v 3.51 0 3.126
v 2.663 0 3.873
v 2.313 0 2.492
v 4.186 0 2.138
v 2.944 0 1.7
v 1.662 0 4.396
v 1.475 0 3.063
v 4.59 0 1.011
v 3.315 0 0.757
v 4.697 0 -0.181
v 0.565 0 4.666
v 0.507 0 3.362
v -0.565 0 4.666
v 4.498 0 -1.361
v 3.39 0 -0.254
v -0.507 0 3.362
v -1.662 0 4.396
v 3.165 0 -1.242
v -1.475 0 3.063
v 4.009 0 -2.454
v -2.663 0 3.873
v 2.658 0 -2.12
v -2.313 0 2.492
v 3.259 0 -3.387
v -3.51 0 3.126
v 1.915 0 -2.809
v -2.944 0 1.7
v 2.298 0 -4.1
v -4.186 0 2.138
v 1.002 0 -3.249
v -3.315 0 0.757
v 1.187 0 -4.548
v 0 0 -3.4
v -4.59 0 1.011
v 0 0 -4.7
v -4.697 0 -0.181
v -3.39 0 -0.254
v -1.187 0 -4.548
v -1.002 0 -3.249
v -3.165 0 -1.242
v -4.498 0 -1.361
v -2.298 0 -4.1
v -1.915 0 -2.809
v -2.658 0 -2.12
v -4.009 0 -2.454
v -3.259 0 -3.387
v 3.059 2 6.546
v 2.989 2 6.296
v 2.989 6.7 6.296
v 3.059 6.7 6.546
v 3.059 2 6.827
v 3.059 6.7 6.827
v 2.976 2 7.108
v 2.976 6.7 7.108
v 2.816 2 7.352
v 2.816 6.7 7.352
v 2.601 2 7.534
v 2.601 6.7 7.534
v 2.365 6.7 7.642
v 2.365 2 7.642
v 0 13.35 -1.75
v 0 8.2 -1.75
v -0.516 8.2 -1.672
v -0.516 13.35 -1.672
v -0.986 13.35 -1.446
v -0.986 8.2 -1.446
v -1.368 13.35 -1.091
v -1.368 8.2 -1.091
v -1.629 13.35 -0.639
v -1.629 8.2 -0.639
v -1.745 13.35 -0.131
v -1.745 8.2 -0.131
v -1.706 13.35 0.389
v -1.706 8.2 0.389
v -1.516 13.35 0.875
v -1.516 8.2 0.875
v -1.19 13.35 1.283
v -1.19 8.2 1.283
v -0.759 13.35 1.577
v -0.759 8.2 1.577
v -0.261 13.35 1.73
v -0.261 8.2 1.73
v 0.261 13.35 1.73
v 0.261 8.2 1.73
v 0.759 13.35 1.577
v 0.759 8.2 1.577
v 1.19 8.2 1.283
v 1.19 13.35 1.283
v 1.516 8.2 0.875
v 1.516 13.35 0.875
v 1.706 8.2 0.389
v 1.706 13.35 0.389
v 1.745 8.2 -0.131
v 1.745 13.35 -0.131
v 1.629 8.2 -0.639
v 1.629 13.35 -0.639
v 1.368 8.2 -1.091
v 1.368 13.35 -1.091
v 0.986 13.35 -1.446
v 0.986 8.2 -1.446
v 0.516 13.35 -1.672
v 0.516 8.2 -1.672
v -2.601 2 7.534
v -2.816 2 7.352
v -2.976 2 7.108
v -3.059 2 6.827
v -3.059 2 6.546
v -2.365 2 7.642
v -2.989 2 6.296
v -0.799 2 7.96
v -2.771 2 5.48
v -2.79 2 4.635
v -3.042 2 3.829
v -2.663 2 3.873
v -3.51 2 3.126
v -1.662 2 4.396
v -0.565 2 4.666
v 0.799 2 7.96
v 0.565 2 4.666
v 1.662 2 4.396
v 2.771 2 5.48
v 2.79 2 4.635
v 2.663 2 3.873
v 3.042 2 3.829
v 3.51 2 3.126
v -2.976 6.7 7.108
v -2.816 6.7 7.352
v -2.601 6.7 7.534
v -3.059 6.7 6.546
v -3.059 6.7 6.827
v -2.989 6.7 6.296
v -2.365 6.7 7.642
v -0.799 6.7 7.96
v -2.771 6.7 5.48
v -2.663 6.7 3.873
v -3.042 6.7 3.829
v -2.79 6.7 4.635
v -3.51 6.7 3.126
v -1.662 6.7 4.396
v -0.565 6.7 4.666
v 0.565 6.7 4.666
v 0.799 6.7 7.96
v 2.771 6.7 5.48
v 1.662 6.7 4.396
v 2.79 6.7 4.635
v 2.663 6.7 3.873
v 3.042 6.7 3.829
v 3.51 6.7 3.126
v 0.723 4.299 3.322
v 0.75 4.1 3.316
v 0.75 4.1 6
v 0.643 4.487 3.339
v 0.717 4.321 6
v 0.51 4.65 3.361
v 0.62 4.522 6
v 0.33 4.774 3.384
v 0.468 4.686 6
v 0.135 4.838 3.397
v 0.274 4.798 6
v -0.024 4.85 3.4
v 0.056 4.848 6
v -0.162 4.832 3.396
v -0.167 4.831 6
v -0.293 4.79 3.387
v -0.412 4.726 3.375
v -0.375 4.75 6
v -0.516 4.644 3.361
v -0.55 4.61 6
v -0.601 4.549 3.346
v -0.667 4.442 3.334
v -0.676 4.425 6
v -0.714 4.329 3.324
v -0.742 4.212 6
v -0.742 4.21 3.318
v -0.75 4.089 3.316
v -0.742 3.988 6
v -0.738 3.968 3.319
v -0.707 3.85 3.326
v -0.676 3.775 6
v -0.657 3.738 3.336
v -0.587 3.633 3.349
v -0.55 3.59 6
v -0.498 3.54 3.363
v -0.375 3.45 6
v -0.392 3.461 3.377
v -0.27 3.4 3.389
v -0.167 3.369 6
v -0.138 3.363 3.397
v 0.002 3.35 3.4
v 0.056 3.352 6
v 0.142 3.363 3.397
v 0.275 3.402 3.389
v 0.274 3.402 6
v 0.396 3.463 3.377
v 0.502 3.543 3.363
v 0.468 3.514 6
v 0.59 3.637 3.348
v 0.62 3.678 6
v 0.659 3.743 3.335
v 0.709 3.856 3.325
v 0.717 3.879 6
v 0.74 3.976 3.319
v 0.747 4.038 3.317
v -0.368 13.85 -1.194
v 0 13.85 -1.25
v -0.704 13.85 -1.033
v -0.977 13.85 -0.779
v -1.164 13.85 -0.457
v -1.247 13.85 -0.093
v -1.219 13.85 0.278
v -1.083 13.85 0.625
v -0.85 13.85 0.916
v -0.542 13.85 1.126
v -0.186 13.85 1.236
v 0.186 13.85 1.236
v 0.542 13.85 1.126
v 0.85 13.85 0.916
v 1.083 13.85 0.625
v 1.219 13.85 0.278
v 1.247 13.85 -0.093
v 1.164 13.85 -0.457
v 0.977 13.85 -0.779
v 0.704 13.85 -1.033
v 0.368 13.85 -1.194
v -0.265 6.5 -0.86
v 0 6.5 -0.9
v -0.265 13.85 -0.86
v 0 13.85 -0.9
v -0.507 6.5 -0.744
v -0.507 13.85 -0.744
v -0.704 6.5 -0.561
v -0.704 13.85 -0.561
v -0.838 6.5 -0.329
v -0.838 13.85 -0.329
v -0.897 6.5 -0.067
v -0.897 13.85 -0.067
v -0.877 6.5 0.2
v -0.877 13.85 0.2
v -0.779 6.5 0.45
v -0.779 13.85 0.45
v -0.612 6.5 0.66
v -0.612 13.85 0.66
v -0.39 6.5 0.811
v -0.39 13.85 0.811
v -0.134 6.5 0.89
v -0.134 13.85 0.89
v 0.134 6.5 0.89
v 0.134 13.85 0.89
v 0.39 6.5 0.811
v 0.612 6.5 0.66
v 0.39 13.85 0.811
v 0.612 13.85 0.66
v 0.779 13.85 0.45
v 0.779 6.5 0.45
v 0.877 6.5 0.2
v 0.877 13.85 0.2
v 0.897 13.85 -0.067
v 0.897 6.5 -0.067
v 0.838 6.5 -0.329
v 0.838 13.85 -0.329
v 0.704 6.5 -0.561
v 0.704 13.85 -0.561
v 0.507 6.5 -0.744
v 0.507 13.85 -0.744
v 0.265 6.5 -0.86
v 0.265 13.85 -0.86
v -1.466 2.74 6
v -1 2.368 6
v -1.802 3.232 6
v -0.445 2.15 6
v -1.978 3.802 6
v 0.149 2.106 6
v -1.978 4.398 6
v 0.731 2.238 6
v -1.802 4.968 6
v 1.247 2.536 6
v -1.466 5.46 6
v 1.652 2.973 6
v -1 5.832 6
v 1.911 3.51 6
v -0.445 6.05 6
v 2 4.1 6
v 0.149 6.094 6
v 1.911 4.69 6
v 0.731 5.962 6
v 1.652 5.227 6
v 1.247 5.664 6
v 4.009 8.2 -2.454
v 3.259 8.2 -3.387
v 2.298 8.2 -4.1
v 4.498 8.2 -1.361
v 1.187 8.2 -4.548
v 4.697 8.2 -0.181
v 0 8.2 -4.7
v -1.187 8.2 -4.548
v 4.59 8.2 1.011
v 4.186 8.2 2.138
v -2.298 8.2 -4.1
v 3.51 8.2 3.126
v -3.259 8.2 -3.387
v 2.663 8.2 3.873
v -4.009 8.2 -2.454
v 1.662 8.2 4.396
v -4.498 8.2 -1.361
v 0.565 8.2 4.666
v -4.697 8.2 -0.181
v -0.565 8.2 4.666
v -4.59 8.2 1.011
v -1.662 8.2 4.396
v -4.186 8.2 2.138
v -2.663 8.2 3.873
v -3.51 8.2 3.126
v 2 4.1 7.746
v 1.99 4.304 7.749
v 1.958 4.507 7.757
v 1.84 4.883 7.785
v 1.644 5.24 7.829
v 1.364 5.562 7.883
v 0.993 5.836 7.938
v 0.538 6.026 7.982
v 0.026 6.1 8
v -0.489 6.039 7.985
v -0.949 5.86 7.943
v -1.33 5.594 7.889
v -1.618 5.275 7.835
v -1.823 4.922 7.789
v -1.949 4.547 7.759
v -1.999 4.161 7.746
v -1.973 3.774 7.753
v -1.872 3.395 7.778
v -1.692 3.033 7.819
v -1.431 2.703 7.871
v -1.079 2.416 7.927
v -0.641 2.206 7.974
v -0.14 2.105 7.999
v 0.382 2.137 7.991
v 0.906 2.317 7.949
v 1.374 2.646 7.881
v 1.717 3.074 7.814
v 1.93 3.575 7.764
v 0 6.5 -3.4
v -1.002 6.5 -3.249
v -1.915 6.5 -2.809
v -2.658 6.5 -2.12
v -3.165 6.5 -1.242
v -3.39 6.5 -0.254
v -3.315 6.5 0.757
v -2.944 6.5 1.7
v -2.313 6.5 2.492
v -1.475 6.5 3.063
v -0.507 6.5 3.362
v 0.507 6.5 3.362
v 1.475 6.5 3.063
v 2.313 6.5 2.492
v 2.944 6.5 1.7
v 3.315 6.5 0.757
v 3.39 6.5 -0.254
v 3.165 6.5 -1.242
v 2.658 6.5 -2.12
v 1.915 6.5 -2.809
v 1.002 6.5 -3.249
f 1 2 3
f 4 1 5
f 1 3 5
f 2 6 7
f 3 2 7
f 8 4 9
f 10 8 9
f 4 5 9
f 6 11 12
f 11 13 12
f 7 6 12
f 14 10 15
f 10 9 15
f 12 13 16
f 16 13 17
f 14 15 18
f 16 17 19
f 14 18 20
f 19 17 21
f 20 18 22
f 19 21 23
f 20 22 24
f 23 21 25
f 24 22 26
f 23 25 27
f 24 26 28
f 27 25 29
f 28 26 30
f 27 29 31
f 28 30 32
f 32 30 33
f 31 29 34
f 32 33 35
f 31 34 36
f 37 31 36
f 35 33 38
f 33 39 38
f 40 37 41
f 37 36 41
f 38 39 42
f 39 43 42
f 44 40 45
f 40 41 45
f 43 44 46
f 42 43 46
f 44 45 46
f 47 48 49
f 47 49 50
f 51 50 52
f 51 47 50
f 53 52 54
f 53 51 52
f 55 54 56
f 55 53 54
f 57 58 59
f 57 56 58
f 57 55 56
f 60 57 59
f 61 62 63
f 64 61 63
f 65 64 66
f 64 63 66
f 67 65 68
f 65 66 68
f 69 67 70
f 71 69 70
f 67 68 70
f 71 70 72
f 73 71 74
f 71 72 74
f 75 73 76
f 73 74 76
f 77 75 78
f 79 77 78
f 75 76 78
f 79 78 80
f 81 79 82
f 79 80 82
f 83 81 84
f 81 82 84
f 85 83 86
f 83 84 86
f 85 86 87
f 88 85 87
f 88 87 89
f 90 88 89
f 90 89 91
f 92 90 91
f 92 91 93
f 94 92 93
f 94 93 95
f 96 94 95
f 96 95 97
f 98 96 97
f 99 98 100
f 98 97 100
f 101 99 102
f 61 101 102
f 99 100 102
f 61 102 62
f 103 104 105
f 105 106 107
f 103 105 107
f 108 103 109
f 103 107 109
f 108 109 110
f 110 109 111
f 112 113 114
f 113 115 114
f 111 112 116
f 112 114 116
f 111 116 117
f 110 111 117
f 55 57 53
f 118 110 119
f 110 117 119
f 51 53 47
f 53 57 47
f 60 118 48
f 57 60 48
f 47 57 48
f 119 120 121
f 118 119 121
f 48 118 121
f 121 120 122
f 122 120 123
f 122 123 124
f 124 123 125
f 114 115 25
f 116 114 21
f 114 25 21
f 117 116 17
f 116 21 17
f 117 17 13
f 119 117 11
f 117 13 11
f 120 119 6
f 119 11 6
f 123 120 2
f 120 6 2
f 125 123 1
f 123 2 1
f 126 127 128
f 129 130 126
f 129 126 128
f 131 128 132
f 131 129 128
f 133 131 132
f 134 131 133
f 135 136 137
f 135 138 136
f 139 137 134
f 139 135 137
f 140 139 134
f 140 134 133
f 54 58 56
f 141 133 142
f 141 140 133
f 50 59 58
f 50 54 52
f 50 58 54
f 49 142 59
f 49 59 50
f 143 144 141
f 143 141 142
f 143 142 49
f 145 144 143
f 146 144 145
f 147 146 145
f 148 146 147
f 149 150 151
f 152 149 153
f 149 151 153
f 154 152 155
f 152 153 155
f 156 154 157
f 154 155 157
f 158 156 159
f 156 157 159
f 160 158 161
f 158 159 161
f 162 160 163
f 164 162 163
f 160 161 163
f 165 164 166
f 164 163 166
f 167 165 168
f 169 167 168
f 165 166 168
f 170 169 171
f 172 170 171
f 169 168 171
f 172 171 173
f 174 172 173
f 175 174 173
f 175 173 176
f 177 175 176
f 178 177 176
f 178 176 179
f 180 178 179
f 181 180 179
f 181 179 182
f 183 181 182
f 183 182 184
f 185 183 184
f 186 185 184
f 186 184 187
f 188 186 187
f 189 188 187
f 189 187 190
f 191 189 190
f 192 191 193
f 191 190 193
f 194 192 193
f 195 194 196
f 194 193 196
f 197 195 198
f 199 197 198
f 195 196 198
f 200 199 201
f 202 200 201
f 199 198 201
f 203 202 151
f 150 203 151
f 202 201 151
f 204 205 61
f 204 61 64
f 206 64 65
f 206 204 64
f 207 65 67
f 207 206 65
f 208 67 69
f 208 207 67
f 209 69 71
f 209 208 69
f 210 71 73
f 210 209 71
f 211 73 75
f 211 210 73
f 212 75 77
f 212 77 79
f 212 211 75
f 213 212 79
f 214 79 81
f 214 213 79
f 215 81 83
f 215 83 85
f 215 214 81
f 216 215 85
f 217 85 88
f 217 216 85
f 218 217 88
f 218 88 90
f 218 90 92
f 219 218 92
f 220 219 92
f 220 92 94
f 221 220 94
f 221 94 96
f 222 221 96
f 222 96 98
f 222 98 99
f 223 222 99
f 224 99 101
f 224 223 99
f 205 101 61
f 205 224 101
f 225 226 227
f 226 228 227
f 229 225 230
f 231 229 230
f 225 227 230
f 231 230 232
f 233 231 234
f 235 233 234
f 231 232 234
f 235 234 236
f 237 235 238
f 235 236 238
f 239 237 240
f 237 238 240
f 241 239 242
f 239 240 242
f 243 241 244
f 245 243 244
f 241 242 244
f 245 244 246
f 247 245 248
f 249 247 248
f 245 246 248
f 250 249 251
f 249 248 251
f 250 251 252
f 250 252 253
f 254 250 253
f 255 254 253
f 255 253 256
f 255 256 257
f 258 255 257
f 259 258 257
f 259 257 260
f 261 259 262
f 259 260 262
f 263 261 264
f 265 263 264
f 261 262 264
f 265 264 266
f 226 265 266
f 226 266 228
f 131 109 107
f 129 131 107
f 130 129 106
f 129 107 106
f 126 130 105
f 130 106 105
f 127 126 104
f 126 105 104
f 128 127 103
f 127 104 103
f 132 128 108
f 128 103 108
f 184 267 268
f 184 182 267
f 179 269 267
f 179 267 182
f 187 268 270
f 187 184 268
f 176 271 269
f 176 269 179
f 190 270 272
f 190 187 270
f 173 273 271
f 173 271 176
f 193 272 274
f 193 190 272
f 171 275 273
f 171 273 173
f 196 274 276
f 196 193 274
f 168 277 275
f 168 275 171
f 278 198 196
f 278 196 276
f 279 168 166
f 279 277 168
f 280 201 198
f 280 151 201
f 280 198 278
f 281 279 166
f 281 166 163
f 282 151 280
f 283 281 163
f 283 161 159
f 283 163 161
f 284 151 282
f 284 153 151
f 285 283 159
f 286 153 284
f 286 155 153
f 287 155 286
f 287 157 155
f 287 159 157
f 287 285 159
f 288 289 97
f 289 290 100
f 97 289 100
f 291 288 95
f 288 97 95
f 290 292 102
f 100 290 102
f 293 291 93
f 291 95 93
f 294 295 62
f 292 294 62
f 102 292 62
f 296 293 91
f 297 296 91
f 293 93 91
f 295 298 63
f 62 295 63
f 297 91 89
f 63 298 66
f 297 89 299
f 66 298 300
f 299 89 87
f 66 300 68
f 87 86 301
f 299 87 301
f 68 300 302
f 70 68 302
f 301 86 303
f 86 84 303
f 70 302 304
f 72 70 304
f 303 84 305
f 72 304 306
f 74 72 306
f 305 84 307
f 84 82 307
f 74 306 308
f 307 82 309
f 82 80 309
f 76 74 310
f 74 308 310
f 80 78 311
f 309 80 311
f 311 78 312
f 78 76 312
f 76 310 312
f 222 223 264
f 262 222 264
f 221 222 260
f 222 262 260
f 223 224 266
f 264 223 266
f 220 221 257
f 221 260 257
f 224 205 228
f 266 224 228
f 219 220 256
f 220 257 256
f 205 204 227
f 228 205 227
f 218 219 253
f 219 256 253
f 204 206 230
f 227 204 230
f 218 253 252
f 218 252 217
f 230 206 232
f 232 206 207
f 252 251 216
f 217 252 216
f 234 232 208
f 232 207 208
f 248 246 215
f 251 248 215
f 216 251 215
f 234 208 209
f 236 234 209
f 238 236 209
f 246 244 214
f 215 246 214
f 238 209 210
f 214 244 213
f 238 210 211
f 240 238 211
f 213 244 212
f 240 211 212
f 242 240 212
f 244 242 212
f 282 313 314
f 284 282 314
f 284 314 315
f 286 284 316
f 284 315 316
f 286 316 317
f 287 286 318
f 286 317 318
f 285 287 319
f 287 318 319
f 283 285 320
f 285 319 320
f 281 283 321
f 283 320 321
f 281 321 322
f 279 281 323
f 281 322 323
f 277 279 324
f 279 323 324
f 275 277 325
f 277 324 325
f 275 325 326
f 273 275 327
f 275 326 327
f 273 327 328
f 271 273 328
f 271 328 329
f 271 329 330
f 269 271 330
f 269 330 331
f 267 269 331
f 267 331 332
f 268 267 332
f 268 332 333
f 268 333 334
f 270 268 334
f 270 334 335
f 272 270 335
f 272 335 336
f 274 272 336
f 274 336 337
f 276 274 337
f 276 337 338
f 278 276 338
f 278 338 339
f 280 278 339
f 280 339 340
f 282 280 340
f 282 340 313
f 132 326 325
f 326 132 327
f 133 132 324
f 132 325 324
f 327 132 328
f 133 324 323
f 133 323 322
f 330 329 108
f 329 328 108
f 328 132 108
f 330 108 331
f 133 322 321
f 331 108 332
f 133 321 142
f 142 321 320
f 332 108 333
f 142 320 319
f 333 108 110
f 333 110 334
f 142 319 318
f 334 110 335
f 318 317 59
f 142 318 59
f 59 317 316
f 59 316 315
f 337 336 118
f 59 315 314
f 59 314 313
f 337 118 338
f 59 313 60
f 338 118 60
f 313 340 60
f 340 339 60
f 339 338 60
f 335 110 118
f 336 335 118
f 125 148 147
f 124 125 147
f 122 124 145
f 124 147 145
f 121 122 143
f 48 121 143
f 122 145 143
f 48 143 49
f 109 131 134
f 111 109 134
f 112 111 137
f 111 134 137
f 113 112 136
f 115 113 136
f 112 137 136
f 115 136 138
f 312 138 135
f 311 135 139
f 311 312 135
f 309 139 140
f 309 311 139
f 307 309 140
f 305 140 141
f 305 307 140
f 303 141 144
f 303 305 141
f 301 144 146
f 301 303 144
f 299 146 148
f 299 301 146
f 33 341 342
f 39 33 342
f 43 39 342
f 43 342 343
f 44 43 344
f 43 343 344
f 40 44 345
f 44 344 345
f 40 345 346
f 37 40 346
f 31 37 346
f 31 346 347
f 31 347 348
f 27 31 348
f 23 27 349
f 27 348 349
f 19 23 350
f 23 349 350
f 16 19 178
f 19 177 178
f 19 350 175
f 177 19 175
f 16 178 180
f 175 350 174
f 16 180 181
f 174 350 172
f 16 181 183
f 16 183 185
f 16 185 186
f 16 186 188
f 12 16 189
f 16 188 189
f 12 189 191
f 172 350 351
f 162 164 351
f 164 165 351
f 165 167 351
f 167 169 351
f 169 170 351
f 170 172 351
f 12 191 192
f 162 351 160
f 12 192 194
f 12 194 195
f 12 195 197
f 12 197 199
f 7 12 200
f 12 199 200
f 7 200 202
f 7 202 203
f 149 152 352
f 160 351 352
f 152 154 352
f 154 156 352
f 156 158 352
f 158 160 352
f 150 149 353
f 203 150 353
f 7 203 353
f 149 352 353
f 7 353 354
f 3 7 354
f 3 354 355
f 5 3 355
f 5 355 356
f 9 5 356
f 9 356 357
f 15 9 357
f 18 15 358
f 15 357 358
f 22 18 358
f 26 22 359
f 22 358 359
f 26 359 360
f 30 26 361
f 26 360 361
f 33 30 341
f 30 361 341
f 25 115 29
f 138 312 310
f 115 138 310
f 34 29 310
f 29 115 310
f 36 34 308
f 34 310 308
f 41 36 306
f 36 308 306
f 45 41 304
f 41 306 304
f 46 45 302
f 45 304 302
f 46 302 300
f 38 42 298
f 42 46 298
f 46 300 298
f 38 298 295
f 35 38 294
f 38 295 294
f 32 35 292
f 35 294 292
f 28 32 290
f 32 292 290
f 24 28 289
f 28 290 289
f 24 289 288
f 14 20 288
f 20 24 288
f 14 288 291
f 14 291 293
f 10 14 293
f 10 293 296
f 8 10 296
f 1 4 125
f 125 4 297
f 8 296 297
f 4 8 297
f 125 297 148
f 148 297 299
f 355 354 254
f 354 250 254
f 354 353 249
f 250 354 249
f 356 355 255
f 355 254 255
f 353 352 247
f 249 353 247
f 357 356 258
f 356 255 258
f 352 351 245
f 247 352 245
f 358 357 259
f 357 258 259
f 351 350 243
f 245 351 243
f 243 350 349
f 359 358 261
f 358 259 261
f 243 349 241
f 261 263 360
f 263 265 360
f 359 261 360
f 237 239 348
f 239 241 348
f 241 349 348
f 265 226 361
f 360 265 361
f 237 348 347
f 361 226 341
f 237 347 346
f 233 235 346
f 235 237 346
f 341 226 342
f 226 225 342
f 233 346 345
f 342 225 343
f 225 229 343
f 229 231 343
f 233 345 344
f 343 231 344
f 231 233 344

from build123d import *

# Parameters (mm, degrees)
CUT_EXTRUDE_1_DEPTH      = 14.97283078
FILLET_1_R               = 1
CUT_EXTRUDE_2_REACH      = 17.831
CUT_EXTRUDE_2_END_RADIUS = 3.4
SKETCH_3_R               = 0.75
SKETCH_4_R               = 2
CUT_EXTRUDE_3_DEPTH      = 2
SKETCH_5_OUTSIDE_W       = 15.602
SKETCH_5_OUTSIDE_H       = 18.902
SKETCH_5_OUTSIDE_R       = 4.7
CUT_EXTRUDE_4_DEPTH      = 1.5
CUT_EXTRUDE_START        = -8.2
SKETCH_5_2_OUTSIDE_W     = 15.602
SKETCH_5_2_OUTSIDE_H     = 18.902
SKETCH_5_2_OUTSIDE_R     = 4.7
CUT_EXTRUDE_5_DEPTH      = 2
CHAMFER_1_SIZE           = 0.5


with BuildPart() as part:
    # Эскиз1 → Повернуть1 (revolve)
    with BuildSketch(Plane(origin=(0, 0, 0), x_dir=(0, 0, -1), z_dir=(1, 0, 0)), mode=Mode.PRIVATE) as revolve_1_sk:
        Polygon((-3.4, 0), (-3.4, 6.5), (-0.9, 6.5), (-0.9, 13.85), (-1.75, 13.85), (-1.75, 8.2), (-8, 8.2), (-8, 0), align=None)
    revolve(revolve_1_sk.sketch.rotate(Axis((0, 0, 0), (0, 1, 0)), 180), axis=Axis((0, 0, 0), (0, 1, 0)))

    # Эскиз2 → Вырез-Вытянуть1 (cut, through all)
    with BuildSketch(Plane(origin=(0, 8.2, 0), x_dir=(1, 0, 0), z_dir=(0, 1, 0))):
        with BuildLine():
            ThreePointArc((7.99025974, -7.116582697), (0, 10.7), (-7.99025974, -7.116582697))
            ThreePointArc((-7.99025974, -7.116582697), (-3.75469644, -7.361538877), (-3.50974026, -3.125975577))
            ThreePointArc((-3.50974026, -3.125975577), (0, 4.7), (3.50974026, -3.125975577))
            ThreePointArc((3.50974026, -3.125975577), (3.75469644, -7.361538877), (7.99025974, -7.116582697))
        make_face()
    extrude(amount=-CUT_EXTRUDE_1_DEPTH, mode=Mode.SUBTRACT)

    # Скругление1
    fillet_1_edges = [part.edges().sort_by_distance(p)[0] for p in [
        (-3.555293146, 4.1, 7.166581517),
        (3.555293146, 4.1, 7.166581517),
    ]]
    fillet(fillet_1_edges, radius=FILLET_1_R)

    # Вырез-Вытянуть2: up to this cylinder (the profile starts outside it)
    cut_extrude_2_end = Plane(origin=(0, 4.1, 0), z_dir=(0, -1, 0)) * Cylinder(CUT_EXTRUDE_2_END_RADIUS, 43.462, mode=Mode.PRIVATE)
    # Эскиз3 → Вырез-Вытянуть2 (cut, up to the surface)
    with BuildSketch(Plane(origin=(0, 8.2, 8), x_dir=(1, 0, 0), z_dir=(0, 0, 1)), mode=Mode.PRIVATE) as cut_extrude_2_sk1:
        with Locations((0, -4.1)):
            Circle(SKETCH_3_R)
    cut_extrude_2_tool1 = extrude(cut_extrude_2_sk1.sketch, amount=-CUT_EXTRUDE_2_REACH, mode=Mode.PRIVATE) - cut_extrude_2_end
    add(cut_extrude_2_tool1.solids().sort_by_distance((0, 4.1, 8))[0], mode=Mode.SUBTRACT)

    # Эскиз4 → Вырез-Вытянуть3 (cut)
    with BuildSketch(Plane(origin=(0, 8.2, 8), x_dir=(1, 0, 0), z_dir=(0, 0, 1))):
        with Locations((0, -4.1)):
            Circle(SKETCH_4_R)
    extrude(amount=-CUT_EXTRUDE_3_DEPTH, mode=Mode.SUBTRACT)

    # Эскиз5 outside → Вырез-Вытянуть4 (cut)
    with BuildSketch(Plane(origin=(0, 8.2, 0), x_dir=(1, 0, 0), z_dir=(0, 1, 0))):
        with Locations((0, -1.65)):
            Rectangle(SKETCH_5_OUTSIDE_W, SKETCH_5_OUTSIDE_H)
        with Locations(Location((0, 0, 0), (0, 0, 270))):
            Circle(SKETCH_5_OUTSIDE_R, mode=Mode.SUBTRACT)
    extrude(amount=-CUT_EXTRUDE_4_DEPTH, mode=Mode.SUBTRACT)

    # Эскиз5<2> outside → Вырез-Вытянуть5 (cut)
    with BuildSketch(Plane(origin=(0, 8.2, 0), x_dir=(1, 0, 0), z_dir=(0, 1, 0)).offset(CUT_EXTRUDE_START)):
        with Locations((0, -1.65)):
            Rectangle(SKETCH_5_2_OUTSIDE_W, SKETCH_5_2_OUTSIDE_H)
        with Locations(Location((0, 0, 0), (0, 0, 270))):
            Circle(SKETCH_5_2_OUTSIDE_R, mode=Mode.SUBTRACT)
    extrude(amount=CUT_EXTRUDE_5_DEPTH, mode=Mode.SUBTRACT)

    # Фаска1
    chamfer_1_edges = [part.edges().sort_by_distance(p)[0] for p in [
        (0, 13.85, 1.75),
    ]]
    chamfer(chamfer_1_edges, length=CHAMFER_1_SIZE)


solid = part.part
